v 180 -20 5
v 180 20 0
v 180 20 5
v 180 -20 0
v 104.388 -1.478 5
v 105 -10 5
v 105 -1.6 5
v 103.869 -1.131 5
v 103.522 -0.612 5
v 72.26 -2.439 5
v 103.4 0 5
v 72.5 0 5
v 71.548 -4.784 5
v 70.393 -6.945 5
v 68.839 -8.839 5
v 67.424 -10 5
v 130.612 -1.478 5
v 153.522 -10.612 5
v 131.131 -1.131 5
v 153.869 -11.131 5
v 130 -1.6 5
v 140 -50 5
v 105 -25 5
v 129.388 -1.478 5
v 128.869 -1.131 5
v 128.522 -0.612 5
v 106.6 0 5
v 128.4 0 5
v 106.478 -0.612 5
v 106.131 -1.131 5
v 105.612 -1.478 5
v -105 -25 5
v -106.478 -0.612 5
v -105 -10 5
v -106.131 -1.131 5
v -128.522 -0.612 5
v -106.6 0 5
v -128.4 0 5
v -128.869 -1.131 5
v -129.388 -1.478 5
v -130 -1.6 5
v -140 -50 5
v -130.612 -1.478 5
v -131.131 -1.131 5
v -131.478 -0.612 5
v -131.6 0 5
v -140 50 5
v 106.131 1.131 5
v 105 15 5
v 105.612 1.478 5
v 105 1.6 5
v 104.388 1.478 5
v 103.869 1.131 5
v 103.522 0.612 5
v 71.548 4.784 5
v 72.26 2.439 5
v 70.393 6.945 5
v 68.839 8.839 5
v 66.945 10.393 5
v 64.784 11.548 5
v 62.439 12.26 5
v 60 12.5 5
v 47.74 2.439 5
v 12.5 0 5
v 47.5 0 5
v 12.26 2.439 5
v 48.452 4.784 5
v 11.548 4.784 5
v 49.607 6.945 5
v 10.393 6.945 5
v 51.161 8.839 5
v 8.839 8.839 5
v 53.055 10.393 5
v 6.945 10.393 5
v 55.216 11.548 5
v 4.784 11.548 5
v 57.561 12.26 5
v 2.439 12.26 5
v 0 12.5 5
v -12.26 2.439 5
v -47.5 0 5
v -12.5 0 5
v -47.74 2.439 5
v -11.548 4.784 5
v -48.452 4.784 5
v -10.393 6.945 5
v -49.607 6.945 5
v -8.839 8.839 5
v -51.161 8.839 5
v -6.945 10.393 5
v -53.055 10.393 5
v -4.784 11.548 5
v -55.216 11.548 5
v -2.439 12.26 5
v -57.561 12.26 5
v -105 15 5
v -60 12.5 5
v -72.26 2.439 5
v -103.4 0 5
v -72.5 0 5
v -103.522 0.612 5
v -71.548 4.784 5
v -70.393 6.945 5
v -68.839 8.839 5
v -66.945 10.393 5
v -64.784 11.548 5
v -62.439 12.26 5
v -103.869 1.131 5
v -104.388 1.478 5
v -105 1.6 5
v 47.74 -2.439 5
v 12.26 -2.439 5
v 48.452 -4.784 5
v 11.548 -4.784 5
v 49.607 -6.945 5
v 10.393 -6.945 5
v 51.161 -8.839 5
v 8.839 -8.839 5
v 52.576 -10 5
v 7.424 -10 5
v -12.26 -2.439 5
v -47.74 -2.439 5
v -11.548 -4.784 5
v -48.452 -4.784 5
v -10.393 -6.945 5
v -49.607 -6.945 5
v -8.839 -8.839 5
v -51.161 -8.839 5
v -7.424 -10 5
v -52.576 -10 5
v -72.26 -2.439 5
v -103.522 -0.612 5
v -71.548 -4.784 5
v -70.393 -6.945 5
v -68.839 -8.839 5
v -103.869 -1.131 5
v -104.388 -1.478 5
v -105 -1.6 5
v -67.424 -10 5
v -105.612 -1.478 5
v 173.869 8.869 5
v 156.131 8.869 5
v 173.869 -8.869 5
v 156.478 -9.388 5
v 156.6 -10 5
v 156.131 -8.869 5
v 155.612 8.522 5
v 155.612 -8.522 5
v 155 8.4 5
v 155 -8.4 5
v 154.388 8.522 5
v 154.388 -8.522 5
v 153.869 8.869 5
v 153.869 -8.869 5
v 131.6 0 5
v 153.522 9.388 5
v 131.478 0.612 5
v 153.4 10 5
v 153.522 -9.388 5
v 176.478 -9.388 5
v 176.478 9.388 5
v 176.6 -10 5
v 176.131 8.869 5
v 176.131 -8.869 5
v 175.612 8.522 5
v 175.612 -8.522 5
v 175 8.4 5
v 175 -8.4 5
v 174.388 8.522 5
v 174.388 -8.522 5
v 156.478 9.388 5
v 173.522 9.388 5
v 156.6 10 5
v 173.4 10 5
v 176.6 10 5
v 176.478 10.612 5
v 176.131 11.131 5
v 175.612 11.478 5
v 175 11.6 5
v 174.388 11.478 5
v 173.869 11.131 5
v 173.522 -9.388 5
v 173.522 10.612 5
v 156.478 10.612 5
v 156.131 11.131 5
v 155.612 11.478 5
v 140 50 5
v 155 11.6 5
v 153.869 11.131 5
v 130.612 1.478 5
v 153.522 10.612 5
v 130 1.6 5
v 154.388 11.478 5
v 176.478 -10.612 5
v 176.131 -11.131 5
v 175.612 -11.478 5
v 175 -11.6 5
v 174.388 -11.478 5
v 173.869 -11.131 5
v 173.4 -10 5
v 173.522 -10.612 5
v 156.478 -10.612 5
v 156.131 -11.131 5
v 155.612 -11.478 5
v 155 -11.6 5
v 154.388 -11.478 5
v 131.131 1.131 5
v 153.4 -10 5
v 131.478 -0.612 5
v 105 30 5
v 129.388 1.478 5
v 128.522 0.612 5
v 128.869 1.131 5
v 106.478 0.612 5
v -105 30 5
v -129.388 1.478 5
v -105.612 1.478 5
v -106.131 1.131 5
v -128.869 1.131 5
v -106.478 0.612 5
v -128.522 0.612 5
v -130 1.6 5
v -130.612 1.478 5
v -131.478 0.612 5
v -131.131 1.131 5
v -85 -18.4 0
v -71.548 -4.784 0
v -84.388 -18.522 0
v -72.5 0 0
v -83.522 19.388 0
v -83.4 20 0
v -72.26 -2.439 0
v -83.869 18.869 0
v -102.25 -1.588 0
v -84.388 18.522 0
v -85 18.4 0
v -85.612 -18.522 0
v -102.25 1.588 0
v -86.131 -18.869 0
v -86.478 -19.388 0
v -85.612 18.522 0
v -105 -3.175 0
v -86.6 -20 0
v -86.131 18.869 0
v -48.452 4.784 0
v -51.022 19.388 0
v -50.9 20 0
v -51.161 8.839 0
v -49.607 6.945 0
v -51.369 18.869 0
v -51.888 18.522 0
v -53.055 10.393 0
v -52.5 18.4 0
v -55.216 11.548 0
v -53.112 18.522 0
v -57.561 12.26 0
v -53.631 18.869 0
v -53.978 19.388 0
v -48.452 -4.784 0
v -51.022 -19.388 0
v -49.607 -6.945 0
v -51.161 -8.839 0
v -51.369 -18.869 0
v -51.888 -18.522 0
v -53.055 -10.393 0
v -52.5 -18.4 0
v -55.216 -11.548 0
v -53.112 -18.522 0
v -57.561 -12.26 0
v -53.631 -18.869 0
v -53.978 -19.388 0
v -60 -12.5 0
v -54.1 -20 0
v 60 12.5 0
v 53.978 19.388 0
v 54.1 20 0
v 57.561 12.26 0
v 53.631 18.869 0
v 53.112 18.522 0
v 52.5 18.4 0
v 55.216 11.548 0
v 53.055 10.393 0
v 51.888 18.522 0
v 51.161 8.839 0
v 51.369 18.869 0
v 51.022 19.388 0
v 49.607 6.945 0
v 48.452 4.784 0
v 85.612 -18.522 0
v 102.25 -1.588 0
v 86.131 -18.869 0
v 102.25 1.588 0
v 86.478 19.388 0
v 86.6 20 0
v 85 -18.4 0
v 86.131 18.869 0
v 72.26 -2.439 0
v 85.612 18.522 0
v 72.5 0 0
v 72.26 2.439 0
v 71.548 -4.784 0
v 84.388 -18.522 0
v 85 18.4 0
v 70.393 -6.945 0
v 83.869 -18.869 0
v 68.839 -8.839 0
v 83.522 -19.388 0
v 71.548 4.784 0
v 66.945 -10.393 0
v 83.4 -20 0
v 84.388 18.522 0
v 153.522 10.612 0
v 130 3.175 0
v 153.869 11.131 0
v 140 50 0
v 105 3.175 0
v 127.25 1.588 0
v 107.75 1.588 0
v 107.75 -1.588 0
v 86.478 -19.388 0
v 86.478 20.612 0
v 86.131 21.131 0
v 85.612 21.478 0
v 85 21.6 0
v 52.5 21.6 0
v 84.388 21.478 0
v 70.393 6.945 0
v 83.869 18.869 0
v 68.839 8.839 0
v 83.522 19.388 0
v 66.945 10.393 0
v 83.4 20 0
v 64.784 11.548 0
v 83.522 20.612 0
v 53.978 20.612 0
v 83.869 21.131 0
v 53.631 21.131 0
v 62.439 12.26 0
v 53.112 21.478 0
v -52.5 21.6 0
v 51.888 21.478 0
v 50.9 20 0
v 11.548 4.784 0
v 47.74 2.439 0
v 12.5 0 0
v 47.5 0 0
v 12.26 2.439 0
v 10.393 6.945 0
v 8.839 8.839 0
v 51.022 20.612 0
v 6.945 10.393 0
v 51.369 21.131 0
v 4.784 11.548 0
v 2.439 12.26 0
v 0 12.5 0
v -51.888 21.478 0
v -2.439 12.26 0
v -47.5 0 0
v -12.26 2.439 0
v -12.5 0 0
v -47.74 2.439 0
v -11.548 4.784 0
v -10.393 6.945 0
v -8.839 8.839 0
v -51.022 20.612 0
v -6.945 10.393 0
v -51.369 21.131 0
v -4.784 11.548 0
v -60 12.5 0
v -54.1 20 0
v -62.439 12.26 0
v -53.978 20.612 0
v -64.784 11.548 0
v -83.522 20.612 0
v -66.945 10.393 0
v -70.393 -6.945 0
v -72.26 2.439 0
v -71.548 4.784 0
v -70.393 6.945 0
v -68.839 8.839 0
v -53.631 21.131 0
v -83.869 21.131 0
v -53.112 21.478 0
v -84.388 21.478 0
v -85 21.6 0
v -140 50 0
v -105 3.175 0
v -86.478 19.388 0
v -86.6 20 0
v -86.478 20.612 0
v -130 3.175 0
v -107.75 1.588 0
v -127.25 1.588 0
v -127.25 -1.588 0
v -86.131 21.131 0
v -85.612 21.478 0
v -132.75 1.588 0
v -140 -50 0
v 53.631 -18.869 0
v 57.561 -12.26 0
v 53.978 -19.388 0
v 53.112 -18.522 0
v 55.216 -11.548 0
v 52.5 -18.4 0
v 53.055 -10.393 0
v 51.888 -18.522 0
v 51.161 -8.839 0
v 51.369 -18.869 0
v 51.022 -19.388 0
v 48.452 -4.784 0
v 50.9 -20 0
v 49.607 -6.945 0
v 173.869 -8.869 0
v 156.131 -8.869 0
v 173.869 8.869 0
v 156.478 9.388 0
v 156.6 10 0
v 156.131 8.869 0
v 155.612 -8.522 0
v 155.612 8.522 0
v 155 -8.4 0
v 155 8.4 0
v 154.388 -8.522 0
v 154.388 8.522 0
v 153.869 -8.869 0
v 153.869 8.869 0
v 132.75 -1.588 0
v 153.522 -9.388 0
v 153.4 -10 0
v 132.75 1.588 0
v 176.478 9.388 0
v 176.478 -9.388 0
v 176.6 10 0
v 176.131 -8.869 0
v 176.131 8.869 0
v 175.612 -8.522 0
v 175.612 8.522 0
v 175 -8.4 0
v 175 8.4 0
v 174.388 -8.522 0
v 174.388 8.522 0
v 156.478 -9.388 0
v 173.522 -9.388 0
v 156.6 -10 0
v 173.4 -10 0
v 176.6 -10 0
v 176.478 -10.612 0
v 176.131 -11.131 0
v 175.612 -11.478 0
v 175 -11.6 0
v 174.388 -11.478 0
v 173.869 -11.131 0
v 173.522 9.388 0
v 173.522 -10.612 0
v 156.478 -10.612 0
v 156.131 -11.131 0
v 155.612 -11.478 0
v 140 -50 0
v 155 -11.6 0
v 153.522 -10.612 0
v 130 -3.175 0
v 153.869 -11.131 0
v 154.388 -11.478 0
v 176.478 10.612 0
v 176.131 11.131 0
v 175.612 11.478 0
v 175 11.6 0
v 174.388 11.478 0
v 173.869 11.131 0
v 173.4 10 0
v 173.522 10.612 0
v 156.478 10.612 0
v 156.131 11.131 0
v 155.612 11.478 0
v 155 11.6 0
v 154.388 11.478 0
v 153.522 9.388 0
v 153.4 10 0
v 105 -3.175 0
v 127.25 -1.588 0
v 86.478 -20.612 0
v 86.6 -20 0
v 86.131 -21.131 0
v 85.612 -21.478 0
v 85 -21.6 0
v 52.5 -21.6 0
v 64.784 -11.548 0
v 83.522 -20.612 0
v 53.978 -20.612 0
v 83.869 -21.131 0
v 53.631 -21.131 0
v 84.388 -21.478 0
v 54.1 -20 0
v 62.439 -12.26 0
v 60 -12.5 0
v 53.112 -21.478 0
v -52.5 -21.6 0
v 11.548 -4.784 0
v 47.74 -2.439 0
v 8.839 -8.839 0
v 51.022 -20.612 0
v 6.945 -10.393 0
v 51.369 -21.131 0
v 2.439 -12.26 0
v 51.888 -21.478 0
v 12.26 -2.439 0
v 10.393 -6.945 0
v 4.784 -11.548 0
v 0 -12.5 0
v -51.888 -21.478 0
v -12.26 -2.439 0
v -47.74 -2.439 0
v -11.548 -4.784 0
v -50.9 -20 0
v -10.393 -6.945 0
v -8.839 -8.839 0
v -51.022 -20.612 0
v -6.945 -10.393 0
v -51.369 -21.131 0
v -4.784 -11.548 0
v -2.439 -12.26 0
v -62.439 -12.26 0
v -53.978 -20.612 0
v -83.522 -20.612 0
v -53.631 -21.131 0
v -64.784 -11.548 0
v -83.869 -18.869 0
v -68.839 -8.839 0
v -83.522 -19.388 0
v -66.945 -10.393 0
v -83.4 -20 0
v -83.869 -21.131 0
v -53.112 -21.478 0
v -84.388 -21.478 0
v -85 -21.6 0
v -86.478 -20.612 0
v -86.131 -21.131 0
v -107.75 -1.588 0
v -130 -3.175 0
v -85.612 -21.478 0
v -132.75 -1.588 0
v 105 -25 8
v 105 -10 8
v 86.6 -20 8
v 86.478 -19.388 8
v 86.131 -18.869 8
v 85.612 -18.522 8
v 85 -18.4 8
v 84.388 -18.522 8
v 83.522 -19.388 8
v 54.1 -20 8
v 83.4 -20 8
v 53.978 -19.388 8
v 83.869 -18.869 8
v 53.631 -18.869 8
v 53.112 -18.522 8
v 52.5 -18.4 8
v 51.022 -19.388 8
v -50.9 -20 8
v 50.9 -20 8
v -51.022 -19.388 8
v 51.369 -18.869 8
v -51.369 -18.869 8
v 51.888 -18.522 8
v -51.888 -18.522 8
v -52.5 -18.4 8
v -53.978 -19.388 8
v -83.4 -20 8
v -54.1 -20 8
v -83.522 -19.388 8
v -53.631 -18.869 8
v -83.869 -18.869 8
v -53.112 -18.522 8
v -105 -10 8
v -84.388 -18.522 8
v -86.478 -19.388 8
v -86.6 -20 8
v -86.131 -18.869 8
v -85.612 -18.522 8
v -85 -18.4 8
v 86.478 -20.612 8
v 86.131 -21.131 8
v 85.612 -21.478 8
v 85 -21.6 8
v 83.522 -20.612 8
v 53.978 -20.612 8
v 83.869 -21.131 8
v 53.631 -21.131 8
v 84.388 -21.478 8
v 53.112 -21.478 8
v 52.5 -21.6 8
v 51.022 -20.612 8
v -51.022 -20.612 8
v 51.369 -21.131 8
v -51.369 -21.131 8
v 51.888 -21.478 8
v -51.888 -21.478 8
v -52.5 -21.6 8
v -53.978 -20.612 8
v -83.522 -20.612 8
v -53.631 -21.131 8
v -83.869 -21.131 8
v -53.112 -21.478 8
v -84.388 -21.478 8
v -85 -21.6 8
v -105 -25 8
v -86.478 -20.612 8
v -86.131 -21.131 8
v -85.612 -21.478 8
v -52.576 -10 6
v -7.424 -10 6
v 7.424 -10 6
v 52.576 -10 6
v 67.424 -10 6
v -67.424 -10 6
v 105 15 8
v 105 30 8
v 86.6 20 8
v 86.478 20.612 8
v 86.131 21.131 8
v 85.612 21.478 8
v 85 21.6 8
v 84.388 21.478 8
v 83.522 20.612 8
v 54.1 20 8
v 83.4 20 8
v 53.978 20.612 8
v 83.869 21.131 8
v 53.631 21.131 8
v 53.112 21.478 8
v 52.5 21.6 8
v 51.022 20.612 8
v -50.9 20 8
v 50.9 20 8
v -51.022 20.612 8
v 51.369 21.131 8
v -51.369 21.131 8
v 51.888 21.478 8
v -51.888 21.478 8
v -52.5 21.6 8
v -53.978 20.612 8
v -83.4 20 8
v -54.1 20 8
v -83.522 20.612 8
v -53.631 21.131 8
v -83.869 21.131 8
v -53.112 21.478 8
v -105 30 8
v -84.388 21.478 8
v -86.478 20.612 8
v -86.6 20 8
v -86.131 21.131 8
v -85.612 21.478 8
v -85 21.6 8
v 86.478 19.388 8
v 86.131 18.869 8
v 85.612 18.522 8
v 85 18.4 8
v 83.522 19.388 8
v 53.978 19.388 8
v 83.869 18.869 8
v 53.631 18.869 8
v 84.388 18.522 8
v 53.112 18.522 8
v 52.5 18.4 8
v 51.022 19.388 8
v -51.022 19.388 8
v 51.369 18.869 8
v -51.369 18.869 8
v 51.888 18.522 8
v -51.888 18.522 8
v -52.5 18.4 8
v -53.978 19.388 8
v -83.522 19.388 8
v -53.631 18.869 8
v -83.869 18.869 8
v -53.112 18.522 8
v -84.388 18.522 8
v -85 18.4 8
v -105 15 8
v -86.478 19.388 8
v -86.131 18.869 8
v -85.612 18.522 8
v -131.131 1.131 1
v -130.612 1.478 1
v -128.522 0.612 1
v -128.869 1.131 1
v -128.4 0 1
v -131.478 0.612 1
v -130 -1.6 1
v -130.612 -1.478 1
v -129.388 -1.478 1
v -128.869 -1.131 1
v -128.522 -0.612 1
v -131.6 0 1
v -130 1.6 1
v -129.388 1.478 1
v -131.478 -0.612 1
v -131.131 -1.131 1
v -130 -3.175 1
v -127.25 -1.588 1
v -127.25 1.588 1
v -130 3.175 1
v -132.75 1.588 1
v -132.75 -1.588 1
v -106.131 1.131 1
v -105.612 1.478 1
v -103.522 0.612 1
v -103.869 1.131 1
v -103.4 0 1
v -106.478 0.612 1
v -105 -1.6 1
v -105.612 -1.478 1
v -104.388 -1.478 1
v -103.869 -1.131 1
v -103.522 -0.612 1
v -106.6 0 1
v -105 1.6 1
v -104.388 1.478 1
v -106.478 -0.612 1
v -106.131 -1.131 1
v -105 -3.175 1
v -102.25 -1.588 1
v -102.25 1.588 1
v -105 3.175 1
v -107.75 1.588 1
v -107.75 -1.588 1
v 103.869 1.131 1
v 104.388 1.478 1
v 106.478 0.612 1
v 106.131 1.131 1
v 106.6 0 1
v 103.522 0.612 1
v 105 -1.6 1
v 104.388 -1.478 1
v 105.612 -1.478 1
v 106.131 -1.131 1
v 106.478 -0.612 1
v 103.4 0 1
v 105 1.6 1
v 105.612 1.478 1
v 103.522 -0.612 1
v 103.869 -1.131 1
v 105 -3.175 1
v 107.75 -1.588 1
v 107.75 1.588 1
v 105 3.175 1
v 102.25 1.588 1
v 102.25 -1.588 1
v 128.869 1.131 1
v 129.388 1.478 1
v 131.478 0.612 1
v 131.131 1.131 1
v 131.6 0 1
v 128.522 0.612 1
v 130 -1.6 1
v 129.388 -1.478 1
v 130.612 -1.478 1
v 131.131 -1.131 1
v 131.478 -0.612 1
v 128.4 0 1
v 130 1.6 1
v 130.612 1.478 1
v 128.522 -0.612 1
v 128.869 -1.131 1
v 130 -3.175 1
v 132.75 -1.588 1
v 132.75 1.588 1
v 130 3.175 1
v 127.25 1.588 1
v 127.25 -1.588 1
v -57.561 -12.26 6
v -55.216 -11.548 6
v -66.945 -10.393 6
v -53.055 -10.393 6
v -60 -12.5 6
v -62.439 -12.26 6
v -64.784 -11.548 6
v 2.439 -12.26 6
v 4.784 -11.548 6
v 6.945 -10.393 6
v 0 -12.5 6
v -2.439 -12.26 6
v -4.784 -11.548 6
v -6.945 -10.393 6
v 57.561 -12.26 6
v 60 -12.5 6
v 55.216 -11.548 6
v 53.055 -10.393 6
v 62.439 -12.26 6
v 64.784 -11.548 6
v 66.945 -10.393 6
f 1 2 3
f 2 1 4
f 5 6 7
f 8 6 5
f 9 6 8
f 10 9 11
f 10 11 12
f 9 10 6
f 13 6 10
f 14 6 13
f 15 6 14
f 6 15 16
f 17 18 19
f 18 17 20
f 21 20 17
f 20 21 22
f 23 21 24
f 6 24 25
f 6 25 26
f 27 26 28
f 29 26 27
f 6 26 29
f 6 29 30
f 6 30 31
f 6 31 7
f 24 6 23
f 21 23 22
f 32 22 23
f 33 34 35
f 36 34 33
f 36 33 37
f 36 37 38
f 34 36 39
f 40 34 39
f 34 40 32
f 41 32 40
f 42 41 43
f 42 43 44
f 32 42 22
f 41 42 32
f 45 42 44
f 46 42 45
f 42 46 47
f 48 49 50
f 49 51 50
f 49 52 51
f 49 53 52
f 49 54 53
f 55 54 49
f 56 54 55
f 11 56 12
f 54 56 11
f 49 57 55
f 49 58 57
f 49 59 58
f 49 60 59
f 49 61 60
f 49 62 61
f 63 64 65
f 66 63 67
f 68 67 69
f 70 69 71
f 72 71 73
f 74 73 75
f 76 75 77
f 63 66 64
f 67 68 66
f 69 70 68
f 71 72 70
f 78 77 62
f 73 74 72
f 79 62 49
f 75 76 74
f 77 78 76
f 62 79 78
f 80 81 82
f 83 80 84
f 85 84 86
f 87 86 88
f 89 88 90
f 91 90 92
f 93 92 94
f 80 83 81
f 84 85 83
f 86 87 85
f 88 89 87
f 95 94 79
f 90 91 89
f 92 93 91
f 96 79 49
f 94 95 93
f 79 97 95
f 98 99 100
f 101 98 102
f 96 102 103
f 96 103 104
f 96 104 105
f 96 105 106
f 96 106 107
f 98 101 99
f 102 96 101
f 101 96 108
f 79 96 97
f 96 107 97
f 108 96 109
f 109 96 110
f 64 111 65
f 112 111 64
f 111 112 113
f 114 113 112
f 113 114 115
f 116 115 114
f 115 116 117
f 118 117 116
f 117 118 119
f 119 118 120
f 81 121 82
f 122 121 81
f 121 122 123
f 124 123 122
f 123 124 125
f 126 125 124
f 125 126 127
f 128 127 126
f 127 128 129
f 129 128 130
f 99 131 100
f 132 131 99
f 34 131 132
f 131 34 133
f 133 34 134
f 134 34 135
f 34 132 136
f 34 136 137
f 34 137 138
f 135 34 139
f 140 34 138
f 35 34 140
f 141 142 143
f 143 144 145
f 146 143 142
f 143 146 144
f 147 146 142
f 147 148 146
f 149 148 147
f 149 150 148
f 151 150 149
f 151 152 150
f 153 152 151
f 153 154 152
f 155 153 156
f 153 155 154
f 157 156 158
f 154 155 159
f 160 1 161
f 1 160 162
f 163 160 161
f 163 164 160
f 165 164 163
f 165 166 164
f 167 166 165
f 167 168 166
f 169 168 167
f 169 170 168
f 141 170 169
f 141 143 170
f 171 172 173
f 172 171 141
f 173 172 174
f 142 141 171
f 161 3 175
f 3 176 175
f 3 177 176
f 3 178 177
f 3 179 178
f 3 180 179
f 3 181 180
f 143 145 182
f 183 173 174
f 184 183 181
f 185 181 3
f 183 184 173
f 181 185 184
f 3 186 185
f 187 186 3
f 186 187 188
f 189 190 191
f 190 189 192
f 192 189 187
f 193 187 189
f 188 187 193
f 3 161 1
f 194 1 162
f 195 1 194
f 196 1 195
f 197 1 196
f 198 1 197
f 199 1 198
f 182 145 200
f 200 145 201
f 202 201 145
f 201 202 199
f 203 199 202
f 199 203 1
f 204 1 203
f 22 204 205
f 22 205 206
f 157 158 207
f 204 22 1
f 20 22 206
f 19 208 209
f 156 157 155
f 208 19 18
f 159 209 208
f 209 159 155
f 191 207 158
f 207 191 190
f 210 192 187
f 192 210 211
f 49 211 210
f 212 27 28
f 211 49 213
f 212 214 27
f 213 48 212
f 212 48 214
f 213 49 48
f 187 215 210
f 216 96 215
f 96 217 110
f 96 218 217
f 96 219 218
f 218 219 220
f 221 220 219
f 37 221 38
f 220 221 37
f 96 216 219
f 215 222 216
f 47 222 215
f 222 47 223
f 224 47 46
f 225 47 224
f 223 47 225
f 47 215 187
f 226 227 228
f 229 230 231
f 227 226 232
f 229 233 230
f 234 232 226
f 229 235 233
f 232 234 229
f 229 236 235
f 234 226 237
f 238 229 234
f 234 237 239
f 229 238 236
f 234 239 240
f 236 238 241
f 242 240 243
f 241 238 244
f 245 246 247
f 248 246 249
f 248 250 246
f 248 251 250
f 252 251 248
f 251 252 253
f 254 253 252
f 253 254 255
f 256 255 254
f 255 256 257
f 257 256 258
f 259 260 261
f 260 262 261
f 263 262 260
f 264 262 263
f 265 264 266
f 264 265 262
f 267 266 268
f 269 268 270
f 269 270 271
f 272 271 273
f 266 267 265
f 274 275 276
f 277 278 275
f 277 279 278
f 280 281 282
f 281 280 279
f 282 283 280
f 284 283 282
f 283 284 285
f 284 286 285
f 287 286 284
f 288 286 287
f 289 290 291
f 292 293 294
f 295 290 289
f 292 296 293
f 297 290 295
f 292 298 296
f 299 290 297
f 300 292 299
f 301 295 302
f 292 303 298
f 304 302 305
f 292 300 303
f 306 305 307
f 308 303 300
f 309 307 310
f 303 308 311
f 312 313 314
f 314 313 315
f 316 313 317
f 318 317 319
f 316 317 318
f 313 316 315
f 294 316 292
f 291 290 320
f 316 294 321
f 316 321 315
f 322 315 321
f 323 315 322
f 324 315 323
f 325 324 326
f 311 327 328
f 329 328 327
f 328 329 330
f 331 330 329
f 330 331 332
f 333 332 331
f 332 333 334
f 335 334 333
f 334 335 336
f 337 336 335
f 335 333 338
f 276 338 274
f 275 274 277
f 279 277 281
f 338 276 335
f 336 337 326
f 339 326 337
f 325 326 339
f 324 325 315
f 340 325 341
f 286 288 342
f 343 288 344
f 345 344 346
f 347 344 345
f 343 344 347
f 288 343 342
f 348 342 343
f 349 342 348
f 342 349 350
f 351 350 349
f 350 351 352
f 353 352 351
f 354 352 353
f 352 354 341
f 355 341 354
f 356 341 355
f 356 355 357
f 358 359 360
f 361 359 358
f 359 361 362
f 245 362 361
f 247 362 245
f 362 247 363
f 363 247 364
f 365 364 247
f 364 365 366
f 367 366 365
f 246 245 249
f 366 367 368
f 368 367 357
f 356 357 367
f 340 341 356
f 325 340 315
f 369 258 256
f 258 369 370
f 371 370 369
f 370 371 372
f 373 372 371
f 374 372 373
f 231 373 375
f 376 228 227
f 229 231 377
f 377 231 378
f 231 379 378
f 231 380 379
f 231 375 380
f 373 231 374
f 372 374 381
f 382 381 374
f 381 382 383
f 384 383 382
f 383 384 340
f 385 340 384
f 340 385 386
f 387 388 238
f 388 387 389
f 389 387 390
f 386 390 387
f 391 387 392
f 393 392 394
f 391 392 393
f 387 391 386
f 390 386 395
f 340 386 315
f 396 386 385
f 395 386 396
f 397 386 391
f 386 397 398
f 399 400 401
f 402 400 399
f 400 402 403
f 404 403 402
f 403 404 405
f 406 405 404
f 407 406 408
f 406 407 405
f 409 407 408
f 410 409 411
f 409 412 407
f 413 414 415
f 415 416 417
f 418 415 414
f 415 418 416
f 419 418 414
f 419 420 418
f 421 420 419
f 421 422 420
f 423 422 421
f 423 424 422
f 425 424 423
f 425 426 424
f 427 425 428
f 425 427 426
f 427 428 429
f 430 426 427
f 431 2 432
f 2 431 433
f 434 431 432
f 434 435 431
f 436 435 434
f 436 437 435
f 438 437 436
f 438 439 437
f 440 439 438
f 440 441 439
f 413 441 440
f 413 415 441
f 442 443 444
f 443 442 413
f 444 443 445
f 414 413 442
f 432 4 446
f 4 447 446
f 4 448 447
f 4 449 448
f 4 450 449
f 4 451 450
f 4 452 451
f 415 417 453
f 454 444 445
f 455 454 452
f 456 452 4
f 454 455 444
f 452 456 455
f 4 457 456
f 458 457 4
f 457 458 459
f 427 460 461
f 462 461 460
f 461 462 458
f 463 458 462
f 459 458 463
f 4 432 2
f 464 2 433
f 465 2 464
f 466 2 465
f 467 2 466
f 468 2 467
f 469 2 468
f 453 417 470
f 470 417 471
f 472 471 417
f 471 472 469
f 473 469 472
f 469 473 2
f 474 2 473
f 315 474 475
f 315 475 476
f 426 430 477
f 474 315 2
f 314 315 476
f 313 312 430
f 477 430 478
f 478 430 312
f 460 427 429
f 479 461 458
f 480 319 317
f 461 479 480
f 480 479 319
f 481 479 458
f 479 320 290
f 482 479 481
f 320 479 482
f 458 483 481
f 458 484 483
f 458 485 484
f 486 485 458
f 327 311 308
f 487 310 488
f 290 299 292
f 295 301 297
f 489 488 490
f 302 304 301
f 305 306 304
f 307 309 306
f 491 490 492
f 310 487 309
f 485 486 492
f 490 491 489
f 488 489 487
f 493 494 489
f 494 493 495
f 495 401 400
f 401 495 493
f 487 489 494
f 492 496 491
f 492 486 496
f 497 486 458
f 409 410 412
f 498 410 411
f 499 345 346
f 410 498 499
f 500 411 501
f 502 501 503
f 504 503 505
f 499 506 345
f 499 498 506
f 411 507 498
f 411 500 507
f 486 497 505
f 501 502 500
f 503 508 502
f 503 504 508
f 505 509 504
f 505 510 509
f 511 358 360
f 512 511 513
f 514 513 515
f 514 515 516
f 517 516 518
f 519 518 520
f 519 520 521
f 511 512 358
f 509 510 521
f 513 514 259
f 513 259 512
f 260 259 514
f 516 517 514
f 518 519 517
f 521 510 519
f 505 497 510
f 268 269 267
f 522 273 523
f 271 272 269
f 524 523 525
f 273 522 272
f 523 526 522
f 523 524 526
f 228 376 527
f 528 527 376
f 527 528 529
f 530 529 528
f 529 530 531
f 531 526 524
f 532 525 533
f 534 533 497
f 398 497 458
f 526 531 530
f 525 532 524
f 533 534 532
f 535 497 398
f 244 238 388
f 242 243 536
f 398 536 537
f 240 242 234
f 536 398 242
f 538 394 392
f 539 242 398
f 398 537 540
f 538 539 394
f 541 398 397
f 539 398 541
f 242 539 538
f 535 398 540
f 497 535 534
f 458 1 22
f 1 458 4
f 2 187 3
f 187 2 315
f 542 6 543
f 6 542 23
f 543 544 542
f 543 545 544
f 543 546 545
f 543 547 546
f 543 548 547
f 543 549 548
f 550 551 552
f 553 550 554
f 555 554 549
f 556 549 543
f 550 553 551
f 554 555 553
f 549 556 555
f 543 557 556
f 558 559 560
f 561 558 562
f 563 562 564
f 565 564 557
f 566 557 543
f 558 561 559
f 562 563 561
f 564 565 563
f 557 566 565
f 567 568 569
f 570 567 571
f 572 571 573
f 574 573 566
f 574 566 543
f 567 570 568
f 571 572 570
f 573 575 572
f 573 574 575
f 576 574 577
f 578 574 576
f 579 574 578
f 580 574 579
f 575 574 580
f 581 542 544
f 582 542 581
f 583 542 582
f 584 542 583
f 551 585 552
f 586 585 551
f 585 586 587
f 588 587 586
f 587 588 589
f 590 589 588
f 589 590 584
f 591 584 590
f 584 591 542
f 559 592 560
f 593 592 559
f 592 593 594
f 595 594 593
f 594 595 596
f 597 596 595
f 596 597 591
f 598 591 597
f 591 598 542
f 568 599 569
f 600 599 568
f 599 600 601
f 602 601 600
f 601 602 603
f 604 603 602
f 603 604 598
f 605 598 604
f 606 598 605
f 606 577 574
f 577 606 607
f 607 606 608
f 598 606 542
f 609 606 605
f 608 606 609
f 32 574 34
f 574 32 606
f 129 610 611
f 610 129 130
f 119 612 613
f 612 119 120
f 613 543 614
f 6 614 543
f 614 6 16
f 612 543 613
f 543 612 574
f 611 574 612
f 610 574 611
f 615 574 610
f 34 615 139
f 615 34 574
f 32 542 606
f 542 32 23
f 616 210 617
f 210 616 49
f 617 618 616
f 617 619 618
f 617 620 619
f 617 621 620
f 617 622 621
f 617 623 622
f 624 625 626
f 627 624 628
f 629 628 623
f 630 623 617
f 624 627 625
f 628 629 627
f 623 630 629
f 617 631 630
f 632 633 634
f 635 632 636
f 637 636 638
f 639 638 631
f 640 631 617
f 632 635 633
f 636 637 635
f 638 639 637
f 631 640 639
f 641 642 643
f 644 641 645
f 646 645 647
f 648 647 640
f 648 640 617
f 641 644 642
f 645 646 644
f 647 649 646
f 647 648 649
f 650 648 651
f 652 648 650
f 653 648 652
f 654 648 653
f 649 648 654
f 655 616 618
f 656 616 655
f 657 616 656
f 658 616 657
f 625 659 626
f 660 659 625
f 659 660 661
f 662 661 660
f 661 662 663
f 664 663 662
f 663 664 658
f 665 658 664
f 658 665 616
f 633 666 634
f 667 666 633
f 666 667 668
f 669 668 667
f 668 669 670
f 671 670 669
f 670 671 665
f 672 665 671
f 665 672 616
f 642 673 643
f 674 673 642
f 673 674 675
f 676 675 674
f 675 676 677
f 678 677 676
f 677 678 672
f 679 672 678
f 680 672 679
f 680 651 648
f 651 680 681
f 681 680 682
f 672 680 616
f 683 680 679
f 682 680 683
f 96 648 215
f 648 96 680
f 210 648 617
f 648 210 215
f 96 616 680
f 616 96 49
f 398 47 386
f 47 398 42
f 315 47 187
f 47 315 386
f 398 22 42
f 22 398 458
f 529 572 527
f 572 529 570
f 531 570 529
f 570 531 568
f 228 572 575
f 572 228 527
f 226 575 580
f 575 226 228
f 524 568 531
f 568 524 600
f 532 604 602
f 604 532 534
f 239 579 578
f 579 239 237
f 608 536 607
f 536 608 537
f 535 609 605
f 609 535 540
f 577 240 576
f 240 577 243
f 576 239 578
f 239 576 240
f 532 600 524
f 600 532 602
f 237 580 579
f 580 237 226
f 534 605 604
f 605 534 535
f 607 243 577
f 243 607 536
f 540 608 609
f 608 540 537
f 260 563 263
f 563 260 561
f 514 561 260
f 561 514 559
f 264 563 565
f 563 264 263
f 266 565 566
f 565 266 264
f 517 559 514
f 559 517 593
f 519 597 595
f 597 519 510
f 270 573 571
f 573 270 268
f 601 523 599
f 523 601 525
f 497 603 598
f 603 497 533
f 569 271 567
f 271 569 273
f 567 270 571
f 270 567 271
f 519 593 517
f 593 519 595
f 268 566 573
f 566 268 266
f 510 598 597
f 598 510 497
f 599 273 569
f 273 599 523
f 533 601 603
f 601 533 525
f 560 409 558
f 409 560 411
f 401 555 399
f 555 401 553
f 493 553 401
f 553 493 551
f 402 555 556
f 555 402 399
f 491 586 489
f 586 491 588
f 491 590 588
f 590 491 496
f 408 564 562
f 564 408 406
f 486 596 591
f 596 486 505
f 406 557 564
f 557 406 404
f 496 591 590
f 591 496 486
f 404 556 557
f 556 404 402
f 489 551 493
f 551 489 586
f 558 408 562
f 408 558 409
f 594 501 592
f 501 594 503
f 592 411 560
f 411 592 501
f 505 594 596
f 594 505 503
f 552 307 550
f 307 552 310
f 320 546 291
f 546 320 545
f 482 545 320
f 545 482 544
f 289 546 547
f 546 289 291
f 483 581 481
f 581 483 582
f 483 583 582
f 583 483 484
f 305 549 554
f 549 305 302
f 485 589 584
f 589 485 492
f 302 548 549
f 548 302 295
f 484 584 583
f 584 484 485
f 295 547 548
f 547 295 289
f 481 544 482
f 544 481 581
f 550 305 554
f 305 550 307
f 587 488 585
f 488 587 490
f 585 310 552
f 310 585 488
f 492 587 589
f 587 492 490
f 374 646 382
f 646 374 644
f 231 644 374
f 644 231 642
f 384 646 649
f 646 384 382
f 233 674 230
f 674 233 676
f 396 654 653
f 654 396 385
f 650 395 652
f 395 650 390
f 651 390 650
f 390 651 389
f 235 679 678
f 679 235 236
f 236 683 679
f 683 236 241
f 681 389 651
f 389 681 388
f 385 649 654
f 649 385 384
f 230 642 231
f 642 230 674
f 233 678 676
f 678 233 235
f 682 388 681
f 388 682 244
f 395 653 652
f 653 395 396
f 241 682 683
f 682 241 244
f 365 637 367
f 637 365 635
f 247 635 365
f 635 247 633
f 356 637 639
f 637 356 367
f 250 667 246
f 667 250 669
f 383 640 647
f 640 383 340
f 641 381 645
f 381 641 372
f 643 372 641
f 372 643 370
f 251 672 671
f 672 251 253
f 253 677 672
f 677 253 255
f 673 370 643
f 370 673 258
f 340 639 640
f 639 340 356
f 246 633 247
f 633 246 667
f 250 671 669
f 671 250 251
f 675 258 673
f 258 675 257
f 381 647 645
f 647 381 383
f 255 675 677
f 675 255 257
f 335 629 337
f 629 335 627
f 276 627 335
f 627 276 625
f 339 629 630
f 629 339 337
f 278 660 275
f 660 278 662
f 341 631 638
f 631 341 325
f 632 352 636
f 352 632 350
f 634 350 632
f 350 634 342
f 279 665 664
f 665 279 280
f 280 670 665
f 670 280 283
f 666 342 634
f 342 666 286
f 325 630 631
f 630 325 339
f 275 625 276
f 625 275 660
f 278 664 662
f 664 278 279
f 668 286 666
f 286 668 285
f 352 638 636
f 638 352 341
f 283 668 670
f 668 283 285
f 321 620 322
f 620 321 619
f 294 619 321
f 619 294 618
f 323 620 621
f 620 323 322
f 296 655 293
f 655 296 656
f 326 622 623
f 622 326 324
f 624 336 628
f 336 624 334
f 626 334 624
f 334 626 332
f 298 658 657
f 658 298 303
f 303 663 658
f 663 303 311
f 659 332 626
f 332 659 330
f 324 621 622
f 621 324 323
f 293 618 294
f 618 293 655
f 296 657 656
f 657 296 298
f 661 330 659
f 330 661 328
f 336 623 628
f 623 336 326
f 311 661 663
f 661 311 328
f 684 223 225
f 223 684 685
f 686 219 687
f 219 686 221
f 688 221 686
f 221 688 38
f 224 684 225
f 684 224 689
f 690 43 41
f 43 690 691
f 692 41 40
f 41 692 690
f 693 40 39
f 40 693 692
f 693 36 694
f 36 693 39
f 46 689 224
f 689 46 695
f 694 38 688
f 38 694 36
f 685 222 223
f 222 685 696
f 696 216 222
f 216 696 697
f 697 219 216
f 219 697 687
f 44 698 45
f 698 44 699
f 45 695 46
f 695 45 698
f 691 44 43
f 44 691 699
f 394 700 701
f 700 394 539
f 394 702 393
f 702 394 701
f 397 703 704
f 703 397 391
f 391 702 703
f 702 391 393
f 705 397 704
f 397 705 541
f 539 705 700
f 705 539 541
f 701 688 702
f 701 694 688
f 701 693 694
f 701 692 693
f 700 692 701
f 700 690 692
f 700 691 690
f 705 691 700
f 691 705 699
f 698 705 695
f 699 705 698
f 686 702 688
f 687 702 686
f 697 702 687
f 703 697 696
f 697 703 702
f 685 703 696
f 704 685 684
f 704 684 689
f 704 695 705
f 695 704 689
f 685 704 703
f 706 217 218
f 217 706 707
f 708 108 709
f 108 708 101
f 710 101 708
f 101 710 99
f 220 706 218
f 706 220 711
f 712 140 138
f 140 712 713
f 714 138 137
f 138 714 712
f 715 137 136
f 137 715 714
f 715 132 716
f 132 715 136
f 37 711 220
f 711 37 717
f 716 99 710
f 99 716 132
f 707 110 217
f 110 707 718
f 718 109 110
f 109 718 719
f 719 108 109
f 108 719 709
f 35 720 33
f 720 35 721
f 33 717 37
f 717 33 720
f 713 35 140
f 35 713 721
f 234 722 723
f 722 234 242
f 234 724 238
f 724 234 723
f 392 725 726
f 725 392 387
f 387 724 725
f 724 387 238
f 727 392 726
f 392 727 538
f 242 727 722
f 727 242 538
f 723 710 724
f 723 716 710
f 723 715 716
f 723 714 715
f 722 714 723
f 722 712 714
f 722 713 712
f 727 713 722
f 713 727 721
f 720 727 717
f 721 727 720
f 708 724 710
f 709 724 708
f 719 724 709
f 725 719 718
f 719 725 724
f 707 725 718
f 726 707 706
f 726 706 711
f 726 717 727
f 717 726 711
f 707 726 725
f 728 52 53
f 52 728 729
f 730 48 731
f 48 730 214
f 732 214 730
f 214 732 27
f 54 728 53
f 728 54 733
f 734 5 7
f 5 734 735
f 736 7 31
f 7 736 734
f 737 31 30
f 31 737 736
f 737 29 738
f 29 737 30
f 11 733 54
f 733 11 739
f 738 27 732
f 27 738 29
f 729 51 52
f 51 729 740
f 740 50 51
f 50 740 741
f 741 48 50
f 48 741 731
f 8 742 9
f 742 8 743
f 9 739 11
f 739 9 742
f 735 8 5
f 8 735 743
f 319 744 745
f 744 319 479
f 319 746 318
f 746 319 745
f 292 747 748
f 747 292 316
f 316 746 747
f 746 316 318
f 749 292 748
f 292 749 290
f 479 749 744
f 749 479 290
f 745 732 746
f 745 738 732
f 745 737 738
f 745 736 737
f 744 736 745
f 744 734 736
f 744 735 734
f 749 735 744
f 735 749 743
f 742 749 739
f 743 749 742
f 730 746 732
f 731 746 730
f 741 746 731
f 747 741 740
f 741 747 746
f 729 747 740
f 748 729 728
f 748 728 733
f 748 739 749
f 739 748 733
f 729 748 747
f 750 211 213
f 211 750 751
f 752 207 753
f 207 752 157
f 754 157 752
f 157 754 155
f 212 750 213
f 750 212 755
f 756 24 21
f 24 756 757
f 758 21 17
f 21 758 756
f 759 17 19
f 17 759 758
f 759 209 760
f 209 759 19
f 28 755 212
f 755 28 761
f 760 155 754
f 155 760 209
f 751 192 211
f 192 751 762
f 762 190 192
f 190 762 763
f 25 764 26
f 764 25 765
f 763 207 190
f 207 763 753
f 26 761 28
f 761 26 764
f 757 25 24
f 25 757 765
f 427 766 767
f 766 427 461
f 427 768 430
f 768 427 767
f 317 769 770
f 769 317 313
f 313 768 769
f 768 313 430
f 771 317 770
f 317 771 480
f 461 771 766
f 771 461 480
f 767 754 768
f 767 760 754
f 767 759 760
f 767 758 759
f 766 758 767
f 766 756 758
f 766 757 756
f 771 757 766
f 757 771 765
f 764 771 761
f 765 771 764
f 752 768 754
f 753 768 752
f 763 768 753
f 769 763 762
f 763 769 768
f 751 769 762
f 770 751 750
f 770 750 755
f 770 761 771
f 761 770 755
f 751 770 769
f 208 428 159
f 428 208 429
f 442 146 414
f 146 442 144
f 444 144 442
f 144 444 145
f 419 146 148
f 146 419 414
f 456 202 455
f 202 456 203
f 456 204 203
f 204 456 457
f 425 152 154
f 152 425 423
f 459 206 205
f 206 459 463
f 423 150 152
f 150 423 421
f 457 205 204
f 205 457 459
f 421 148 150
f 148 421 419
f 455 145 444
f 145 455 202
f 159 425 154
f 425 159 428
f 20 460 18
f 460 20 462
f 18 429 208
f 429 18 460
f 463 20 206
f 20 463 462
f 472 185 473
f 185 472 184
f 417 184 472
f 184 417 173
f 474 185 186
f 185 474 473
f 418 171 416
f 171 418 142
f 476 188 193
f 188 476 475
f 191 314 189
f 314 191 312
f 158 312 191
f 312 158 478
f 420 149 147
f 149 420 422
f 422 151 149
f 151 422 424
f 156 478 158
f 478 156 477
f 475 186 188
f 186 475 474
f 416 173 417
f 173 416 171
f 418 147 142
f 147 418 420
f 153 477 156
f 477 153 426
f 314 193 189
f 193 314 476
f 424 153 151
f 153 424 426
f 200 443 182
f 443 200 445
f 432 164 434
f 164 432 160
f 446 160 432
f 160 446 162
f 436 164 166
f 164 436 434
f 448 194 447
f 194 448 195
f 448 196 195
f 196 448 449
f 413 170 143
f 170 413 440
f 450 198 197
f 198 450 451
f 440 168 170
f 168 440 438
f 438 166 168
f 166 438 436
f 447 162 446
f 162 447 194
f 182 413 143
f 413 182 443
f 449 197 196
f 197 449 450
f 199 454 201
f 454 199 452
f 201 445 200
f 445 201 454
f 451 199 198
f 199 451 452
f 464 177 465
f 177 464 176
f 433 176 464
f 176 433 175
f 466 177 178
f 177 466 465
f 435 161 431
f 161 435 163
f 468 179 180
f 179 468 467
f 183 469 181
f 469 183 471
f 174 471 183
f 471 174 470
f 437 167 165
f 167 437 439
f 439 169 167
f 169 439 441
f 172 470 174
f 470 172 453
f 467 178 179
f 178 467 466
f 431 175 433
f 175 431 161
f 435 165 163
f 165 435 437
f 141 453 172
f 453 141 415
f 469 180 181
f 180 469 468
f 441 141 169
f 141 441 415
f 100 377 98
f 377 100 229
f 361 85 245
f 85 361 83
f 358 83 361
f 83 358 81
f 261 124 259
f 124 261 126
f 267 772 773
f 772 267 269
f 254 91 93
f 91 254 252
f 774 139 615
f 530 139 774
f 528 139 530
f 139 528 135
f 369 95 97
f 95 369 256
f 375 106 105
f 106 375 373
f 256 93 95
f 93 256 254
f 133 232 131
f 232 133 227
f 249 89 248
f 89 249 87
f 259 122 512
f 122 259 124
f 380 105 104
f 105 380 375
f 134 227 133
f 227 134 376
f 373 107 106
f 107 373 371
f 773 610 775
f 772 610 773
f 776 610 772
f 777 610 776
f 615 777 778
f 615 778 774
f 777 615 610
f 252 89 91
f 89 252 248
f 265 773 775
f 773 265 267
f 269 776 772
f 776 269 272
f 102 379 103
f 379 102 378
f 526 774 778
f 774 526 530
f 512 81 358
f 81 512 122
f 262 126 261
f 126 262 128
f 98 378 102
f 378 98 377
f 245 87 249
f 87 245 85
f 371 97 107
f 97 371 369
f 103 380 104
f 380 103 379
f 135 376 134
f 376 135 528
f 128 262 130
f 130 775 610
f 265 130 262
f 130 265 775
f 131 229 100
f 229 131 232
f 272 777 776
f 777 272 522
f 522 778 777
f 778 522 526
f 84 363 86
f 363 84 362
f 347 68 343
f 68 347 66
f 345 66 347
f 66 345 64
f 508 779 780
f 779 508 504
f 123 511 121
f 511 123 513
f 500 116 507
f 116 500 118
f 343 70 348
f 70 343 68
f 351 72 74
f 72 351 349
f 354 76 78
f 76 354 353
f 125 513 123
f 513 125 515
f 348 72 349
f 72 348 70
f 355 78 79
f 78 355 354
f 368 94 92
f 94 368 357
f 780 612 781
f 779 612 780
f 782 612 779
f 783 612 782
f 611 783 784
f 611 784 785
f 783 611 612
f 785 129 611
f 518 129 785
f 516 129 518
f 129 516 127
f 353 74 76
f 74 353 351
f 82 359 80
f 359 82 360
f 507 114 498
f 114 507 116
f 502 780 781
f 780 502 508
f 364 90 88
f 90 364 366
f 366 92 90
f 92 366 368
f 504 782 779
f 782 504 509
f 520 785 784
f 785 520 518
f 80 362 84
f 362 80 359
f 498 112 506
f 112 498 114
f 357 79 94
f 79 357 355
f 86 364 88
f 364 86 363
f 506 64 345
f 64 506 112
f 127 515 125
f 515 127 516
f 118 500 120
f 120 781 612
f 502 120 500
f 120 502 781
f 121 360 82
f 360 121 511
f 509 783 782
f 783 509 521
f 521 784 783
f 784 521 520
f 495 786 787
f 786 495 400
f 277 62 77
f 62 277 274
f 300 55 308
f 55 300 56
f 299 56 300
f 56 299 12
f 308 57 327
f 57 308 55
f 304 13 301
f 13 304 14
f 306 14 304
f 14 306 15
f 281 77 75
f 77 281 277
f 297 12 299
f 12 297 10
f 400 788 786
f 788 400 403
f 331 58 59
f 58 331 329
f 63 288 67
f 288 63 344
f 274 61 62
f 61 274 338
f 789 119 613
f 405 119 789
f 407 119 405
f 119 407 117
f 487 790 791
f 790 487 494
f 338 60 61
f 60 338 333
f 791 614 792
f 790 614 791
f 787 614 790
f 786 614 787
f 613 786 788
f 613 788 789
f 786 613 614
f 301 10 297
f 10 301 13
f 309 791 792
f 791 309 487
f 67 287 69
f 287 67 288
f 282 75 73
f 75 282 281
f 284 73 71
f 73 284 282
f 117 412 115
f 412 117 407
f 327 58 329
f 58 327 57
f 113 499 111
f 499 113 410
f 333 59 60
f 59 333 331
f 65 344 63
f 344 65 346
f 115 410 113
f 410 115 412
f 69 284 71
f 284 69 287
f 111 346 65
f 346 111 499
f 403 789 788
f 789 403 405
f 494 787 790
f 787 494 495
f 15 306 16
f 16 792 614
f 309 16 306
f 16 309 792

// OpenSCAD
// file: ../common.scad
/*
 * WAVE OCEAN V10 - COMMON PARAMETERS
 *
 * Shared constants, tolerances, and hardware specifications
 * All dimensions in mm
 *
 * MECHANISM: Helical groove cam drives 24 slats via follower arms
 * - Worm rotates around X axis
 * - Groove follows helix at radius GROOVE_RADIUS
 * - Follower rollers ride in groove, push slats up/down
 * - Phase difference along X creates traveling wave illusion
 */

// ============================================
// PRINT TOLERANCES (tune for your printer)
// ============================================

TOL_CLEARANCE = 0.2;         // Shaft in hole clearance
TOL_PRESS_FIT = -0.15;       // Bearing press-fit interference
TOL_SLIDING = 0.4;           // Sliding fit (guide slots)
TOL_SCREW_HOLE = 0.2;        // Screw hole clearance

// ============================================
// HARDWARE - BEARINGS
// ============================================

// 608 bearing (worm shaft)
BEARING_608_ID = 8;
BEARING_608_OD = 22;
BEARING_608_H = 7;

// 624 bearing (follower rollers)
BEARING_624_ID = 4;
BEARING_624_OD = 13;
BEARING_624_H = 5;

// ============================================
// HARDWARE - FASTENERS
// ============================================

M3_HOLE_DIA = 3 + TOL_SCREW_HOLE;      // 3.2mm
M3_HEAD_DIA = 5.5;
M3_HEAD_H = 3;
M3_NUT_FLAT = 5.5;
M3_NUT_H = 2.4;
M3_INSERT_DIA = 4.0;                    // Heat-set insert hole
M3_INSERT_DEPTH = 5;

// ============================================
// HARDWARE - SHAFTS AND PINS
// ============================================

WORM_SHAFT_DIA = 8;
WORM_SHAFT_LENGTH = 280;               // Extends beyond worm for bearings

ROLLER_AXLE_DIA = 4;
ROLLER_AXLE_LENGTH = 12;

PIVOT_PIN_DIA = 3;
PIVOT_PIN_LENGTH = 15;

// ============================================
// WORM CAM DIMENSIONS
// ============================================

WORM_LENGTH = 200;
WORM_OUTER_RADIUS = 20;              // 40mm diameter (bigger for deeper groove)
WORM_CORE_RADIUS = 10;               // 20mm diameter core
WORM_SHAFT_HOLE = WORM_SHAFT_DIA + TOL_CLEARANCE;  // 8.2mm

// Groove sized to contain 624 bearing roller
GROOVE_WIDTH = BEARING_624_H + 2;    // 7mm wide (bearing + clearance)
GROOVE_DEPTH = BEARING_624_OD/2 + 3; // 9.5mm deep (half bearing + margin)
GROOVE_RADIUS = WORM_OUTER_RADIUS - GROOVE_DEPTH/2;  // ~15mm from center

HELIX_PITCH = 25;                    // 25mm per rotation = 8 turns over 200mm

// ============================================
// SLAT DIMENSIONS
// ============================================

NUM_SLATS = 24;
SLAT_SPACING = WORM_LENGTH / NUM_SLATS;  // 8.33mm

SLAT_WIDTH = 5;                       // X dimension (slightly wider)
SLAT_DEPTH = 30;                      // Y dimension (narrower)
SLAT_HEIGHT = 40;                     // Z dimension

// Wave motion amplitude (half of total travel)
WAVE_AMPLITUDE = 10;                  // ±10mm vertical motion

// ============================================
// FOLLOWER ARM DIMENSIONS
// ============================================

ARM_LENGTH = 35;                      // Pivot to roller center (LONGER)
ARM_WIDTH = 8;
ARM_THICKNESS = 6;

PIVOT_HOLE = PIVOT_PIN_DIA + TOL_CLEARANCE;    // 3.2mm
ROLLER_AXLE_HOLE = ROLLER_AXLE_DIA + TOL_CLEARANCE;  // 4.2mm

// ============================================
// SLAT BRACKET DIMENSIONS
// ============================================

BRACKET_WIDTH = 12;
BRACKET_DEPTH = 20;
BRACKET_HEIGHT = 25;

// ============================================
// GUIDE RAIL DIMENSIONS
// ============================================

GUIDE_LENGTH = 210;
GUIDE_HEIGHT = 30;                    // Taller for more travel
GUIDE_DEPTH = 10;
GUIDE_WALL = 3;

SLOT_WIDTH = SLAT_WIDTH + TOL_SLIDING;   // Slat slides in slot, not bracket tab
SLOT_HEIGHT = WAVE_AMPLITUDE * 2 + 10;   // Allow full travel + margin

// ============================================
// BEARING BLOCK DIMENSIONS
// ============================================

BEARING_BLOCK_WIDTH = 35;
BEARING_BLOCK_DEPTH = 35;
BEARING_BLOCK_HEIGHT = 30;

BEARING_POCKET_DIA = BEARING_608_OD + TOL_PRESS_FIT;  // 21.85mm
BEARING_POCKET_DEPTH = BEARING_608_H + 1;             // 8mm

// ============================================
// BASE PLATE DIMENSIONS
// ============================================

BASE_LENGTH = 280;                    // Longer to fit everything
BASE_WIDTH = 100;                     // Wider for stability
BASE_THICKNESS = 5;

// ============================================
// MOTOR MOUNT DIMENSIONS
// ============================================

N20_BODY_DIA = 12;
N20_BODY_LENGTH = 15;
N20_GEARBOX_DIA = 10;
N20_GEARBOX_LENGTH = 12;
N20_SHAFT_DIA = 3;
N20_SHAFT_LENGTH = 10;

// ============================================
// ASSEMBLY POSITIONS
// ============================================

// Worm center position
// Shaft runs along X axis at this Z height
WORM_CENTER_Z = BASE_THICKNESS + BEARING_BLOCK_HEIGHT;  // 35mm

// Guide rail positions (front and back of slats)
// Slats are centered at Y=0, spanning ±SLAT_DEPTH/2
GUIDE_FRONT_Y = -SLAT_DEPTH/2 - GUIDE_DEPTH/2;   // -20
GUIDE_BACK_Y = SLAT_DEPTH/2 + GUIDE_DEPTH/2;     // +20

// Guide rail Z - slats hang down from here
// Positioned so slat bottom can reach groove at top of worm
GUIDE_Z = WORM_CENTER_Z + WORM_OUTER_RADIUS + SLAT_HEIGHT/2 + 5;  // 80mm

// Bearing block X positions (at ends of worm, inward facing)
BEARING_L_X = -WORM_LENGTH/2 - BEARING_BLOCK_WIDTH/2;   // -117.5
BEARING_R_X = WORM_LENGTH/2 + BEARING_BLOCK_WIDTH/2;    // +117.5

// Motor mount X position (beyond right bearing block)
MOTOR_MOUNT_X = BEARING_R_X + BEARING_BLOCK_WIDTH/2 + 30;

// ============================================
// COLORS (for assembly visualization)
// ============================================

C_WORM = [0.75, 0.55, 0.2];
C_SLAT = [0.2, 0.45, 0.75];
C_BRACKET = [0.4, 0.4, 0.45];
C_ARM = [0.5, 0.5, 0.55];
C_GUIDE = [0.35, 0.35, 0.4];
C_BEARING_BLOCK = [0.3, 0.35, 0.4];
C_BASE = [0.25, 0.25, 0.3];
C_SHAFT = [0.6, 0.6, 0.65];
C_BEARING = [0.7, 0.7, 0.75];
C_MOTOR = [0.3, 0.3, 0.35];

// ============================================
// HELPER FUNCTIONS
// ============================================

// Helix angle at position X along worm (in degrees)
function helix_angle(x) = (x / HELIX_PITCH) * 360;

// Combined phase: helix position + shaft rotation
function phase(x, theta) = helix_angle(x) + theta;

// Groove center position in Y-Z plane (polar coordinates from shaft)
// Y = radius * sin(angle), Z = center + radius * cos(angle)
function groove_y(x, theta) = GROOVE_RADIUS * sin(phase(x, theta));
function groove_z(x, theta) = WORM_CENTER_Z + GROOVE_RADIUS * cos(phase(x, theta));

// Slat X position (evenly spaced along worm length)
function slat_x(i) = i * SLAT_SPACING - WORM_LENGTH/2 + SLAT_SPACING/2;

// Slat Z position - follows groove Z position via follower arm
// When groove is at top (cos=1), slat is pushed up
// When groove is at bottom (cos=-1), slat drops down
function slat_z(i, theta) =
    let(x = slat_x(i))
    GUIDE_Z + GROOVE_RADIUS * cos(phase(x, theta)) - GROOVE_RADIUS;

// ============================================
// CLEARANCE VERIFICATION
// ============================================

// Slat gap: SLAT_SPACING - SLAT_WIDTH = 8.33 - 5 = 3.33mm ✓
// Arm reach: ARM_LENGTH = 35mm, needs to reach ~30mm ✓
// Groove depth: 9.5mm, bearing radius 6.5mm ✓
// Wave travel: ±GROOVE_RADIUS * cos variation = ±15mm

// ============================================
// QUALITY SETTINGS
// ============================================

$fn = 48;  // Default facets
// main file
/*
 * BASE PLATE - Main Structural Base
 *
 * Printable part: 1x (or 2x if split)
 * Print orientation: Flat
 *
 * Features:
 * - Mounting holes for guide rails
 * - Mounting holes for bearing blocks
 * - Motor mount extension
 * - Optional split line for smaller printers
 */

include <../common.scad>

$fn = 32;

// ============================================
// SPLIT OPTIONS
// ============================================

SPLIT_PLATE = false;         // Set true to split for smaller printers
SHOW_LEFT_HALF = true;
SHOW_RIGHT_HALF = true;

// ============================================
// MAIN BASE PLATE MODULE
// ============================================

module base_plate() {
    difference() {
        union() {
            // Main plate
            main_plate();

            // Motor mount extension
            motor_extension();

            // Guide rail mounting standoffs
            guide_standoffs();
        }

        // Guide rail mounting holes
        guide_rail_holes();

        // Bearing block mounting holes
        bearing_block_holes();

        // Motor mount holes
        motor_mount_holes();

        // Split alignment holes (if splitting)
        if (SPLIT_PLATE) {
            alignment_holes();
        }

        // Lightening holes
        lightening_holes();
    }
}

// ============================================
// MAIN PLATE
// ============================================

module main_plate() {
    translate([-BASE_LENGTH/2, -BASE_WIDTH/2, 0])
        cube([BASE_LENGTH, BASE_WIDTH, BASE_THICKNESS]);
}

// ============================================
// MOTOR EXTENSION
// ============================================

module motor_extension() {
    // Extension on right side for motor mount
    ext_length = 40;
    ext_width = 40;

    translate([BASE_LENGTH/2, -ext_width/2, 0])
        cube([ext_length, ext_width, BASE_THICKNESS]);

    // Transition fillet
    translate([BASE_LENGTH/2, -BASE_WIDTH/2, 0])
    linear_extrude(height=BASE_THICKNESS)
        polygon([[0, 0], [ext_length, BASE_WIDTH/2 - ext_width/2], [0, BASE_WIDTH/2 - ext_width/2]]);

    translate([BASE_LENGTH/2, BASE_WIDTH/2, 0])
    linear_extrude(height=BASE_THICKNESS)
        polygon([[0, 0], [ext_length, -(BASE_WIDTH/2 - ext_width/2)], [0, -(BASE_WIDTH/2 - ext_width/2)]]);
}

// ============================================
// GUIDE STANDOFFS
// ============================================

module guide_standoffs() {
    // Raised areas where guide rails mount
    standoff_height = 3;

    // Front guide standoff
    translate([-GUIDE_LENGTH/2, GUIDE_FRONT_Y - 5, BASE_THICKNESS])
        cube([GUIDE_LENGTH, 15, standoff_height]);

    // Back guide standoff
    translate([-GUIDE_LENGTH/2, GUIDE_BACK_Y - 5, BASE_THICKNESS])
        cube([GUIDE_LENGTH, 15, standoff_height]);
}

// ============================================
// MOUNTING HOLES
// ============================================

module guide_rail_holes() {
    // Front guide rail - 4 holes
    for (x = [-GUIDE_LENGTH/2 + 20, -GUIDE_LENGTH/4, GUIDE_LENGTH/4, GUIDE_LENGTH/2 - 20]) {
        translate([x, GUIDE_FRONT_Y, -1])
            cylinder(d=M3_HOLE_DIA, h=BASE_THICKNESS + 10, $fn=16);
    }

    // Back guide rail - 4 holes
    for (x = [-GUIDE_LENGTH/2 + 20, -GUIDE_LENGTH/4, GUIDE_LENGTH/4, GUIDE_LENGTH/2 - 20]) {
        translate([x, GUIDE_BACK_Y, -1])
            cylinder(d=M3_HOLE_DIA, h=BASE_THICKNESS + 10, $fn=16);
    }
}

module bearing_block_holes() {
    // Left bearing block - 2 holes
    hole_offset = BEARING_BLOCK_WIDTH/2 - 5;
    for (x = [-hole_offset, hole_offset]) {
        translate([BEARING_L_X + x, 0, -1]) {
            cylinder(d=M3_HOLE_DIA, h=BASE_THICKNESS + 10, $fn=16);
            // Nut trap on bottom
            translate([0, 0, -M3_NUT_H + 1])
            rotate([0, 0, 30])
                cylinder(d=M3_NUT_FLAT * 2 / sqrt(3), h=M3_NUT_H + 1, $fn=6);
        }
    }

    // Right bearing block - 2 holes
    for (x = [-hole_offset, hole_offset]) {
        translate([BEARING_R_X + x, 0, -1]) {
            cylinder(d=M3_HOLE_DIA, h=BASE_THICKNESS + 10, $fn=16);
            translate([0, 0, -M3_NUT_H + 1])
            rotate([0, 0, 30])
                cylinder(d=M3_NUT_FLAT * 2 / sqrt(3), h=M3_NUT_H + 1, $fn=6);
        }
    }
}

module motor_mount_holes() {
    // 4 holes for motor mount
    motor_x = BASE_LENGTH/2 + 25;

    for (dx = [-10, 10]) {
        for (dy = [-10, 10]) {
            translate([motor_x + dx, dy, -1])
                cylinder(d=M3_HOLE_DIA, h=BASE_THICKNESS + 10, $fn=16);
        }
    }
}

// ============================================
// ALIGNMENT AND LIGHTENING
// ============================================

module alignment_holes() {
    // Dowel holes at split line for alignment
    for (y = [-20, 0, 20]) {
        translate([0, y, BASE_THICKNESS/2])
        rotate([0, 90, 0])
            cylinder(d=4.1, h=20, center=true, $fn=16);
    }
}

module lightening_holes() {
    // Optional holes to reduce material/weight
    // Large cutouts between mounting points

    for (x = [-60, 0, 60]) {
        translate([x, 0, -1])
            cylinder(d=25, h=BASE_THICKNESS + 2, $fn=32);
    }
}

// ============================================
// RENDER
// ============================================

color(C_BASE)
if (SPLIT_PLATE) {
    if (SHOW_LEFT_HALF) {
        intersection() {
            base_plate();
            translate([-200, -100, -1])
                cube([200, 200, 20]);
        }
    }
    if (SHOW_RIGHT_HALF) {
        intersection() {
            base_plate();
            translate([0, -100, -1])
                cube([200, 200, 20]);
        }
    }
} else {
    base_plate();
}

// ============================================
// INFO
// ============================================

echo("=== BASE PLATE ===");
echo(str("Length: ", BASE_LENGTH, "mm + 40mm motor extension"));
echo(str("Width: ", BASE_WIDTH, "mm"));
echo(str("Thickness: ", BASE_THICKNESS, "mm"));
echo("");
echo("Print quantity: 1 (or 2 if SPLIT_PLATE=true)");
echo("Print orientation: Flat");
echo("Set SPLIT_PLATE=true if plate exceeds print bed");
